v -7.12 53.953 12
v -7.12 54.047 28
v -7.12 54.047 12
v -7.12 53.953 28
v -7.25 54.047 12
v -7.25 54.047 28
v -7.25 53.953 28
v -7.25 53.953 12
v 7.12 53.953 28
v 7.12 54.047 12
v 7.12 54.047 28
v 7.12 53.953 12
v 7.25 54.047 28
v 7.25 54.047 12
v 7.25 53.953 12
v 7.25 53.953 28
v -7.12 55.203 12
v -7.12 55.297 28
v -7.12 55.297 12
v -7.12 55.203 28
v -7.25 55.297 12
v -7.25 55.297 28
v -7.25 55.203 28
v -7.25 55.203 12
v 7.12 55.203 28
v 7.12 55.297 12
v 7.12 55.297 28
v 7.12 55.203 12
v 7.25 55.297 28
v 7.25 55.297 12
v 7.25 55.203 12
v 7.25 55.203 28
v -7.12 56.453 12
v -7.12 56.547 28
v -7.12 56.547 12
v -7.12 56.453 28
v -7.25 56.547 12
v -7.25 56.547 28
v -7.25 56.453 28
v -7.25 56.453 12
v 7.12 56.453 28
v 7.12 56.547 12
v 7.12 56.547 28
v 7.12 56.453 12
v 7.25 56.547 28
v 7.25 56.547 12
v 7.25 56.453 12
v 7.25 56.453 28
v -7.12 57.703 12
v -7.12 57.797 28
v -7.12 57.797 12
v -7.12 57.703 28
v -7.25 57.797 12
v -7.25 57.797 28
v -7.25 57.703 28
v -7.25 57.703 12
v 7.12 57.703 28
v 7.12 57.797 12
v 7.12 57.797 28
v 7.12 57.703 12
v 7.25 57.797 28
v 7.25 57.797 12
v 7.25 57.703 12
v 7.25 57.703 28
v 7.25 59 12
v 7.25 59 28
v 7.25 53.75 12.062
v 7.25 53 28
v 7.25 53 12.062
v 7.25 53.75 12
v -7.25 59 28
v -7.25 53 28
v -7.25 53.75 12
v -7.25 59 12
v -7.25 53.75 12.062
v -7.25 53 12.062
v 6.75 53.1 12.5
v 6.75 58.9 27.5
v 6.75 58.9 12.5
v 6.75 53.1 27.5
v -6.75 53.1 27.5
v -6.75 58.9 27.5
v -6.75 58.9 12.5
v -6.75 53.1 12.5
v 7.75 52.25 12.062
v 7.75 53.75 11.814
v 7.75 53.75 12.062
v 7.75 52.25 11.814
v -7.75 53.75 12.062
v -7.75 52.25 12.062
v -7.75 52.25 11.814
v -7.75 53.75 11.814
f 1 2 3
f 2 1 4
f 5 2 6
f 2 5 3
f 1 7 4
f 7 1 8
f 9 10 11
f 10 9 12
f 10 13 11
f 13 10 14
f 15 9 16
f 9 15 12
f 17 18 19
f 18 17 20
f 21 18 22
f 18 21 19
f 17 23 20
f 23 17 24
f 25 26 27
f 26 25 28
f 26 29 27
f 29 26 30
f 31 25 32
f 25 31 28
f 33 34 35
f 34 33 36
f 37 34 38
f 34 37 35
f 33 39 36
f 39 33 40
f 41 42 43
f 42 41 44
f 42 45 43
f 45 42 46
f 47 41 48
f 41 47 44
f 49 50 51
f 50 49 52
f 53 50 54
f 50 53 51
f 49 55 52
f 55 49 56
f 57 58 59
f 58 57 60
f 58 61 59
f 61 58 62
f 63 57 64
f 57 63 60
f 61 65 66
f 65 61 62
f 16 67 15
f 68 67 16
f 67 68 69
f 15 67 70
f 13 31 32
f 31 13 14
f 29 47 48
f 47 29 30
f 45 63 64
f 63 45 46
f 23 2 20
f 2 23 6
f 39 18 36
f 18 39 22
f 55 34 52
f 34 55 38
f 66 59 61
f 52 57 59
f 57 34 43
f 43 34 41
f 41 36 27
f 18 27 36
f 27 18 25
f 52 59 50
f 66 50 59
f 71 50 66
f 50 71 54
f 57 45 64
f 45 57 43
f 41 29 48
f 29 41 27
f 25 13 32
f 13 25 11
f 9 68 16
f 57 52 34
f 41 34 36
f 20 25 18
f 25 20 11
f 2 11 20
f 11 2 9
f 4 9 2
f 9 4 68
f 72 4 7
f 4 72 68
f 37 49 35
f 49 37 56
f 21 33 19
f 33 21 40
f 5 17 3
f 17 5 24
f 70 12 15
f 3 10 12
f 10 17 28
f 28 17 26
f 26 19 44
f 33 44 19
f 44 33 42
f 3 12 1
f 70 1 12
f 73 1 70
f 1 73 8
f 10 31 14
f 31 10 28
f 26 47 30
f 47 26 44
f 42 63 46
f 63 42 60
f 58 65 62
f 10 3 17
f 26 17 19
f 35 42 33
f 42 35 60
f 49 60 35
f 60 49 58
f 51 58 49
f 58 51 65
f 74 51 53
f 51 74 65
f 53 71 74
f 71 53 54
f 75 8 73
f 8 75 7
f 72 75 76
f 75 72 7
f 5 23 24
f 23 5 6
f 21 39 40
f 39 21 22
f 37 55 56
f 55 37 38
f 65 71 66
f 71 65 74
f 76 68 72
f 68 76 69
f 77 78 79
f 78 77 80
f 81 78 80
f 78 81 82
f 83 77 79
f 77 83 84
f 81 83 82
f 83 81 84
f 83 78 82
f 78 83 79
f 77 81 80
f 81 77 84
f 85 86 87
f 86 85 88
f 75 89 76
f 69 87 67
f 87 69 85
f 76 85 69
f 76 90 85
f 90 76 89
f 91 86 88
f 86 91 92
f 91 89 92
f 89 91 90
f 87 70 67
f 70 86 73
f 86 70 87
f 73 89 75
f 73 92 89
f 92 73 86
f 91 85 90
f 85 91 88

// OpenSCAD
// ============================================================================
// MODULE: TITAN GEMINI XVI AVIONICS CHASSIS HOUSING CARD BAY
// REPOSITORY PATH: src/avionics_bay.scad
// HARDWARE REQUIREMENT: INTEGRATED SLIDE-CHANNELS (ZERO-BOLT FLANGE DESIGN)
// COMPLIANCE: 0.062" SKELETON WALL THICKNESS RATIO CEILING (DOC ENFORCED)
// ============================================================================

$fn = 120; // Maintain crisp edge radii for precise snap-fit PCB slider slots

// --- AVIONICS BAY CONFIGURATION CONSTANTS (INCHES) ---
SKELETON_CEILING = 0.062;    // Regulated "Mining Hat" structural framework floor
CHASSIS_WIDTH = 14.5;        // Width of the central motherboard bay housing
CHASSIS_HEIGHT = 16.0;       // Vertical clearance profile for multi-layer card stacks
PCB_SLOT_W = 0.093;          // Standard width of heavy-duty 2oz/3oz gold-lattice PCB boards
PCB_SLOT_D = 0.125;          // Depth of the tracking channel cut into the casing walls
NUM_SLOTS = 4;               // Number of parallel card bays in the stack

module MultiLayerAvionicsCardBay() {
    echo("CNC Toolpath: Milling Zero-Fastener Avionics Card Bay Casing; Slots =", NUM_SLOTS);
    
    color("DarkSlateGray")
    difference() {
        // 1. Primary raw solid titanium-aluminum block stock (Enforces structural rigidity)
        cube([CHASSIS_WIDTH, 6.0, CHASSIS_HEIGHT], center = true);
        
        // 2. Central hollowing pass to clear out weight-reduction interior volume
        cube([CHASSIS_WIDTH - 1.0, 5.8, CHASSIS_HEIGHT - 1.0], center = true);
        
        // 3. PARALLEL CNC SLIDER CHANNELS: Carving the vertical tracks for the KiCad boards
        for (slot = [0 : 1 : NUM_SLOTS - 1]) {
            slot_offset_y = -2.0 + (slot * 1.25);
            
            // Left-Side Vertical Tracking Slot
            translate([-CHASSIS_WIDTH / 2 + PCB_SLOT_D / 2, slot_offset_y, 0])
            cube([PCB_SLOT_D + 0.01, PCB_SLOT_W, CHASSIS_HEIGHT + 0.1], center = true);
            
            // Right-Side Vertical Tracking Slot
            translate([CHASSIS_WIDTH / 2 - PCB_SLOT_D / 2, slot_offset_y, 0])
            cube([PCB_SLOT_D + 0.01, PCB_SLOT_W, CHASSIS_HEIGHT + 0.1], center = true);
        }
    }
}

module IntegratedChassisMounts(cabin_radius) {
    // Hooks your finished avionics casing block directly to the 0.062" internal stringer ribs
    translate([0, cabin_radius - 2.5, 20.0]) // Positioned safely low on the cabin wall skeleton
    union() {
        MultiLayerAvionicsCardBay();
        
        // Bottom running weight-bearing step flange
        translate([0, -3.0, -CHASSIS_HEIGHT / 2 - SKELETON_CEILING])
        color("Silver")
        cube([CHASSIS_WIDTH + 1.0, 1.5, SKELETON_CEILING * 4], center = true);
    }
}

// ============================================================================
// CNC WORKSTATION FIELD VERIFICATION VIEWPORT DISPLAY
// ============================================================================
// Simulates the internal electronics rack installation audit
IntegratedChassisMounts(cabin_radius = 58.5); // Scaled for the 120-inch Titan hull
